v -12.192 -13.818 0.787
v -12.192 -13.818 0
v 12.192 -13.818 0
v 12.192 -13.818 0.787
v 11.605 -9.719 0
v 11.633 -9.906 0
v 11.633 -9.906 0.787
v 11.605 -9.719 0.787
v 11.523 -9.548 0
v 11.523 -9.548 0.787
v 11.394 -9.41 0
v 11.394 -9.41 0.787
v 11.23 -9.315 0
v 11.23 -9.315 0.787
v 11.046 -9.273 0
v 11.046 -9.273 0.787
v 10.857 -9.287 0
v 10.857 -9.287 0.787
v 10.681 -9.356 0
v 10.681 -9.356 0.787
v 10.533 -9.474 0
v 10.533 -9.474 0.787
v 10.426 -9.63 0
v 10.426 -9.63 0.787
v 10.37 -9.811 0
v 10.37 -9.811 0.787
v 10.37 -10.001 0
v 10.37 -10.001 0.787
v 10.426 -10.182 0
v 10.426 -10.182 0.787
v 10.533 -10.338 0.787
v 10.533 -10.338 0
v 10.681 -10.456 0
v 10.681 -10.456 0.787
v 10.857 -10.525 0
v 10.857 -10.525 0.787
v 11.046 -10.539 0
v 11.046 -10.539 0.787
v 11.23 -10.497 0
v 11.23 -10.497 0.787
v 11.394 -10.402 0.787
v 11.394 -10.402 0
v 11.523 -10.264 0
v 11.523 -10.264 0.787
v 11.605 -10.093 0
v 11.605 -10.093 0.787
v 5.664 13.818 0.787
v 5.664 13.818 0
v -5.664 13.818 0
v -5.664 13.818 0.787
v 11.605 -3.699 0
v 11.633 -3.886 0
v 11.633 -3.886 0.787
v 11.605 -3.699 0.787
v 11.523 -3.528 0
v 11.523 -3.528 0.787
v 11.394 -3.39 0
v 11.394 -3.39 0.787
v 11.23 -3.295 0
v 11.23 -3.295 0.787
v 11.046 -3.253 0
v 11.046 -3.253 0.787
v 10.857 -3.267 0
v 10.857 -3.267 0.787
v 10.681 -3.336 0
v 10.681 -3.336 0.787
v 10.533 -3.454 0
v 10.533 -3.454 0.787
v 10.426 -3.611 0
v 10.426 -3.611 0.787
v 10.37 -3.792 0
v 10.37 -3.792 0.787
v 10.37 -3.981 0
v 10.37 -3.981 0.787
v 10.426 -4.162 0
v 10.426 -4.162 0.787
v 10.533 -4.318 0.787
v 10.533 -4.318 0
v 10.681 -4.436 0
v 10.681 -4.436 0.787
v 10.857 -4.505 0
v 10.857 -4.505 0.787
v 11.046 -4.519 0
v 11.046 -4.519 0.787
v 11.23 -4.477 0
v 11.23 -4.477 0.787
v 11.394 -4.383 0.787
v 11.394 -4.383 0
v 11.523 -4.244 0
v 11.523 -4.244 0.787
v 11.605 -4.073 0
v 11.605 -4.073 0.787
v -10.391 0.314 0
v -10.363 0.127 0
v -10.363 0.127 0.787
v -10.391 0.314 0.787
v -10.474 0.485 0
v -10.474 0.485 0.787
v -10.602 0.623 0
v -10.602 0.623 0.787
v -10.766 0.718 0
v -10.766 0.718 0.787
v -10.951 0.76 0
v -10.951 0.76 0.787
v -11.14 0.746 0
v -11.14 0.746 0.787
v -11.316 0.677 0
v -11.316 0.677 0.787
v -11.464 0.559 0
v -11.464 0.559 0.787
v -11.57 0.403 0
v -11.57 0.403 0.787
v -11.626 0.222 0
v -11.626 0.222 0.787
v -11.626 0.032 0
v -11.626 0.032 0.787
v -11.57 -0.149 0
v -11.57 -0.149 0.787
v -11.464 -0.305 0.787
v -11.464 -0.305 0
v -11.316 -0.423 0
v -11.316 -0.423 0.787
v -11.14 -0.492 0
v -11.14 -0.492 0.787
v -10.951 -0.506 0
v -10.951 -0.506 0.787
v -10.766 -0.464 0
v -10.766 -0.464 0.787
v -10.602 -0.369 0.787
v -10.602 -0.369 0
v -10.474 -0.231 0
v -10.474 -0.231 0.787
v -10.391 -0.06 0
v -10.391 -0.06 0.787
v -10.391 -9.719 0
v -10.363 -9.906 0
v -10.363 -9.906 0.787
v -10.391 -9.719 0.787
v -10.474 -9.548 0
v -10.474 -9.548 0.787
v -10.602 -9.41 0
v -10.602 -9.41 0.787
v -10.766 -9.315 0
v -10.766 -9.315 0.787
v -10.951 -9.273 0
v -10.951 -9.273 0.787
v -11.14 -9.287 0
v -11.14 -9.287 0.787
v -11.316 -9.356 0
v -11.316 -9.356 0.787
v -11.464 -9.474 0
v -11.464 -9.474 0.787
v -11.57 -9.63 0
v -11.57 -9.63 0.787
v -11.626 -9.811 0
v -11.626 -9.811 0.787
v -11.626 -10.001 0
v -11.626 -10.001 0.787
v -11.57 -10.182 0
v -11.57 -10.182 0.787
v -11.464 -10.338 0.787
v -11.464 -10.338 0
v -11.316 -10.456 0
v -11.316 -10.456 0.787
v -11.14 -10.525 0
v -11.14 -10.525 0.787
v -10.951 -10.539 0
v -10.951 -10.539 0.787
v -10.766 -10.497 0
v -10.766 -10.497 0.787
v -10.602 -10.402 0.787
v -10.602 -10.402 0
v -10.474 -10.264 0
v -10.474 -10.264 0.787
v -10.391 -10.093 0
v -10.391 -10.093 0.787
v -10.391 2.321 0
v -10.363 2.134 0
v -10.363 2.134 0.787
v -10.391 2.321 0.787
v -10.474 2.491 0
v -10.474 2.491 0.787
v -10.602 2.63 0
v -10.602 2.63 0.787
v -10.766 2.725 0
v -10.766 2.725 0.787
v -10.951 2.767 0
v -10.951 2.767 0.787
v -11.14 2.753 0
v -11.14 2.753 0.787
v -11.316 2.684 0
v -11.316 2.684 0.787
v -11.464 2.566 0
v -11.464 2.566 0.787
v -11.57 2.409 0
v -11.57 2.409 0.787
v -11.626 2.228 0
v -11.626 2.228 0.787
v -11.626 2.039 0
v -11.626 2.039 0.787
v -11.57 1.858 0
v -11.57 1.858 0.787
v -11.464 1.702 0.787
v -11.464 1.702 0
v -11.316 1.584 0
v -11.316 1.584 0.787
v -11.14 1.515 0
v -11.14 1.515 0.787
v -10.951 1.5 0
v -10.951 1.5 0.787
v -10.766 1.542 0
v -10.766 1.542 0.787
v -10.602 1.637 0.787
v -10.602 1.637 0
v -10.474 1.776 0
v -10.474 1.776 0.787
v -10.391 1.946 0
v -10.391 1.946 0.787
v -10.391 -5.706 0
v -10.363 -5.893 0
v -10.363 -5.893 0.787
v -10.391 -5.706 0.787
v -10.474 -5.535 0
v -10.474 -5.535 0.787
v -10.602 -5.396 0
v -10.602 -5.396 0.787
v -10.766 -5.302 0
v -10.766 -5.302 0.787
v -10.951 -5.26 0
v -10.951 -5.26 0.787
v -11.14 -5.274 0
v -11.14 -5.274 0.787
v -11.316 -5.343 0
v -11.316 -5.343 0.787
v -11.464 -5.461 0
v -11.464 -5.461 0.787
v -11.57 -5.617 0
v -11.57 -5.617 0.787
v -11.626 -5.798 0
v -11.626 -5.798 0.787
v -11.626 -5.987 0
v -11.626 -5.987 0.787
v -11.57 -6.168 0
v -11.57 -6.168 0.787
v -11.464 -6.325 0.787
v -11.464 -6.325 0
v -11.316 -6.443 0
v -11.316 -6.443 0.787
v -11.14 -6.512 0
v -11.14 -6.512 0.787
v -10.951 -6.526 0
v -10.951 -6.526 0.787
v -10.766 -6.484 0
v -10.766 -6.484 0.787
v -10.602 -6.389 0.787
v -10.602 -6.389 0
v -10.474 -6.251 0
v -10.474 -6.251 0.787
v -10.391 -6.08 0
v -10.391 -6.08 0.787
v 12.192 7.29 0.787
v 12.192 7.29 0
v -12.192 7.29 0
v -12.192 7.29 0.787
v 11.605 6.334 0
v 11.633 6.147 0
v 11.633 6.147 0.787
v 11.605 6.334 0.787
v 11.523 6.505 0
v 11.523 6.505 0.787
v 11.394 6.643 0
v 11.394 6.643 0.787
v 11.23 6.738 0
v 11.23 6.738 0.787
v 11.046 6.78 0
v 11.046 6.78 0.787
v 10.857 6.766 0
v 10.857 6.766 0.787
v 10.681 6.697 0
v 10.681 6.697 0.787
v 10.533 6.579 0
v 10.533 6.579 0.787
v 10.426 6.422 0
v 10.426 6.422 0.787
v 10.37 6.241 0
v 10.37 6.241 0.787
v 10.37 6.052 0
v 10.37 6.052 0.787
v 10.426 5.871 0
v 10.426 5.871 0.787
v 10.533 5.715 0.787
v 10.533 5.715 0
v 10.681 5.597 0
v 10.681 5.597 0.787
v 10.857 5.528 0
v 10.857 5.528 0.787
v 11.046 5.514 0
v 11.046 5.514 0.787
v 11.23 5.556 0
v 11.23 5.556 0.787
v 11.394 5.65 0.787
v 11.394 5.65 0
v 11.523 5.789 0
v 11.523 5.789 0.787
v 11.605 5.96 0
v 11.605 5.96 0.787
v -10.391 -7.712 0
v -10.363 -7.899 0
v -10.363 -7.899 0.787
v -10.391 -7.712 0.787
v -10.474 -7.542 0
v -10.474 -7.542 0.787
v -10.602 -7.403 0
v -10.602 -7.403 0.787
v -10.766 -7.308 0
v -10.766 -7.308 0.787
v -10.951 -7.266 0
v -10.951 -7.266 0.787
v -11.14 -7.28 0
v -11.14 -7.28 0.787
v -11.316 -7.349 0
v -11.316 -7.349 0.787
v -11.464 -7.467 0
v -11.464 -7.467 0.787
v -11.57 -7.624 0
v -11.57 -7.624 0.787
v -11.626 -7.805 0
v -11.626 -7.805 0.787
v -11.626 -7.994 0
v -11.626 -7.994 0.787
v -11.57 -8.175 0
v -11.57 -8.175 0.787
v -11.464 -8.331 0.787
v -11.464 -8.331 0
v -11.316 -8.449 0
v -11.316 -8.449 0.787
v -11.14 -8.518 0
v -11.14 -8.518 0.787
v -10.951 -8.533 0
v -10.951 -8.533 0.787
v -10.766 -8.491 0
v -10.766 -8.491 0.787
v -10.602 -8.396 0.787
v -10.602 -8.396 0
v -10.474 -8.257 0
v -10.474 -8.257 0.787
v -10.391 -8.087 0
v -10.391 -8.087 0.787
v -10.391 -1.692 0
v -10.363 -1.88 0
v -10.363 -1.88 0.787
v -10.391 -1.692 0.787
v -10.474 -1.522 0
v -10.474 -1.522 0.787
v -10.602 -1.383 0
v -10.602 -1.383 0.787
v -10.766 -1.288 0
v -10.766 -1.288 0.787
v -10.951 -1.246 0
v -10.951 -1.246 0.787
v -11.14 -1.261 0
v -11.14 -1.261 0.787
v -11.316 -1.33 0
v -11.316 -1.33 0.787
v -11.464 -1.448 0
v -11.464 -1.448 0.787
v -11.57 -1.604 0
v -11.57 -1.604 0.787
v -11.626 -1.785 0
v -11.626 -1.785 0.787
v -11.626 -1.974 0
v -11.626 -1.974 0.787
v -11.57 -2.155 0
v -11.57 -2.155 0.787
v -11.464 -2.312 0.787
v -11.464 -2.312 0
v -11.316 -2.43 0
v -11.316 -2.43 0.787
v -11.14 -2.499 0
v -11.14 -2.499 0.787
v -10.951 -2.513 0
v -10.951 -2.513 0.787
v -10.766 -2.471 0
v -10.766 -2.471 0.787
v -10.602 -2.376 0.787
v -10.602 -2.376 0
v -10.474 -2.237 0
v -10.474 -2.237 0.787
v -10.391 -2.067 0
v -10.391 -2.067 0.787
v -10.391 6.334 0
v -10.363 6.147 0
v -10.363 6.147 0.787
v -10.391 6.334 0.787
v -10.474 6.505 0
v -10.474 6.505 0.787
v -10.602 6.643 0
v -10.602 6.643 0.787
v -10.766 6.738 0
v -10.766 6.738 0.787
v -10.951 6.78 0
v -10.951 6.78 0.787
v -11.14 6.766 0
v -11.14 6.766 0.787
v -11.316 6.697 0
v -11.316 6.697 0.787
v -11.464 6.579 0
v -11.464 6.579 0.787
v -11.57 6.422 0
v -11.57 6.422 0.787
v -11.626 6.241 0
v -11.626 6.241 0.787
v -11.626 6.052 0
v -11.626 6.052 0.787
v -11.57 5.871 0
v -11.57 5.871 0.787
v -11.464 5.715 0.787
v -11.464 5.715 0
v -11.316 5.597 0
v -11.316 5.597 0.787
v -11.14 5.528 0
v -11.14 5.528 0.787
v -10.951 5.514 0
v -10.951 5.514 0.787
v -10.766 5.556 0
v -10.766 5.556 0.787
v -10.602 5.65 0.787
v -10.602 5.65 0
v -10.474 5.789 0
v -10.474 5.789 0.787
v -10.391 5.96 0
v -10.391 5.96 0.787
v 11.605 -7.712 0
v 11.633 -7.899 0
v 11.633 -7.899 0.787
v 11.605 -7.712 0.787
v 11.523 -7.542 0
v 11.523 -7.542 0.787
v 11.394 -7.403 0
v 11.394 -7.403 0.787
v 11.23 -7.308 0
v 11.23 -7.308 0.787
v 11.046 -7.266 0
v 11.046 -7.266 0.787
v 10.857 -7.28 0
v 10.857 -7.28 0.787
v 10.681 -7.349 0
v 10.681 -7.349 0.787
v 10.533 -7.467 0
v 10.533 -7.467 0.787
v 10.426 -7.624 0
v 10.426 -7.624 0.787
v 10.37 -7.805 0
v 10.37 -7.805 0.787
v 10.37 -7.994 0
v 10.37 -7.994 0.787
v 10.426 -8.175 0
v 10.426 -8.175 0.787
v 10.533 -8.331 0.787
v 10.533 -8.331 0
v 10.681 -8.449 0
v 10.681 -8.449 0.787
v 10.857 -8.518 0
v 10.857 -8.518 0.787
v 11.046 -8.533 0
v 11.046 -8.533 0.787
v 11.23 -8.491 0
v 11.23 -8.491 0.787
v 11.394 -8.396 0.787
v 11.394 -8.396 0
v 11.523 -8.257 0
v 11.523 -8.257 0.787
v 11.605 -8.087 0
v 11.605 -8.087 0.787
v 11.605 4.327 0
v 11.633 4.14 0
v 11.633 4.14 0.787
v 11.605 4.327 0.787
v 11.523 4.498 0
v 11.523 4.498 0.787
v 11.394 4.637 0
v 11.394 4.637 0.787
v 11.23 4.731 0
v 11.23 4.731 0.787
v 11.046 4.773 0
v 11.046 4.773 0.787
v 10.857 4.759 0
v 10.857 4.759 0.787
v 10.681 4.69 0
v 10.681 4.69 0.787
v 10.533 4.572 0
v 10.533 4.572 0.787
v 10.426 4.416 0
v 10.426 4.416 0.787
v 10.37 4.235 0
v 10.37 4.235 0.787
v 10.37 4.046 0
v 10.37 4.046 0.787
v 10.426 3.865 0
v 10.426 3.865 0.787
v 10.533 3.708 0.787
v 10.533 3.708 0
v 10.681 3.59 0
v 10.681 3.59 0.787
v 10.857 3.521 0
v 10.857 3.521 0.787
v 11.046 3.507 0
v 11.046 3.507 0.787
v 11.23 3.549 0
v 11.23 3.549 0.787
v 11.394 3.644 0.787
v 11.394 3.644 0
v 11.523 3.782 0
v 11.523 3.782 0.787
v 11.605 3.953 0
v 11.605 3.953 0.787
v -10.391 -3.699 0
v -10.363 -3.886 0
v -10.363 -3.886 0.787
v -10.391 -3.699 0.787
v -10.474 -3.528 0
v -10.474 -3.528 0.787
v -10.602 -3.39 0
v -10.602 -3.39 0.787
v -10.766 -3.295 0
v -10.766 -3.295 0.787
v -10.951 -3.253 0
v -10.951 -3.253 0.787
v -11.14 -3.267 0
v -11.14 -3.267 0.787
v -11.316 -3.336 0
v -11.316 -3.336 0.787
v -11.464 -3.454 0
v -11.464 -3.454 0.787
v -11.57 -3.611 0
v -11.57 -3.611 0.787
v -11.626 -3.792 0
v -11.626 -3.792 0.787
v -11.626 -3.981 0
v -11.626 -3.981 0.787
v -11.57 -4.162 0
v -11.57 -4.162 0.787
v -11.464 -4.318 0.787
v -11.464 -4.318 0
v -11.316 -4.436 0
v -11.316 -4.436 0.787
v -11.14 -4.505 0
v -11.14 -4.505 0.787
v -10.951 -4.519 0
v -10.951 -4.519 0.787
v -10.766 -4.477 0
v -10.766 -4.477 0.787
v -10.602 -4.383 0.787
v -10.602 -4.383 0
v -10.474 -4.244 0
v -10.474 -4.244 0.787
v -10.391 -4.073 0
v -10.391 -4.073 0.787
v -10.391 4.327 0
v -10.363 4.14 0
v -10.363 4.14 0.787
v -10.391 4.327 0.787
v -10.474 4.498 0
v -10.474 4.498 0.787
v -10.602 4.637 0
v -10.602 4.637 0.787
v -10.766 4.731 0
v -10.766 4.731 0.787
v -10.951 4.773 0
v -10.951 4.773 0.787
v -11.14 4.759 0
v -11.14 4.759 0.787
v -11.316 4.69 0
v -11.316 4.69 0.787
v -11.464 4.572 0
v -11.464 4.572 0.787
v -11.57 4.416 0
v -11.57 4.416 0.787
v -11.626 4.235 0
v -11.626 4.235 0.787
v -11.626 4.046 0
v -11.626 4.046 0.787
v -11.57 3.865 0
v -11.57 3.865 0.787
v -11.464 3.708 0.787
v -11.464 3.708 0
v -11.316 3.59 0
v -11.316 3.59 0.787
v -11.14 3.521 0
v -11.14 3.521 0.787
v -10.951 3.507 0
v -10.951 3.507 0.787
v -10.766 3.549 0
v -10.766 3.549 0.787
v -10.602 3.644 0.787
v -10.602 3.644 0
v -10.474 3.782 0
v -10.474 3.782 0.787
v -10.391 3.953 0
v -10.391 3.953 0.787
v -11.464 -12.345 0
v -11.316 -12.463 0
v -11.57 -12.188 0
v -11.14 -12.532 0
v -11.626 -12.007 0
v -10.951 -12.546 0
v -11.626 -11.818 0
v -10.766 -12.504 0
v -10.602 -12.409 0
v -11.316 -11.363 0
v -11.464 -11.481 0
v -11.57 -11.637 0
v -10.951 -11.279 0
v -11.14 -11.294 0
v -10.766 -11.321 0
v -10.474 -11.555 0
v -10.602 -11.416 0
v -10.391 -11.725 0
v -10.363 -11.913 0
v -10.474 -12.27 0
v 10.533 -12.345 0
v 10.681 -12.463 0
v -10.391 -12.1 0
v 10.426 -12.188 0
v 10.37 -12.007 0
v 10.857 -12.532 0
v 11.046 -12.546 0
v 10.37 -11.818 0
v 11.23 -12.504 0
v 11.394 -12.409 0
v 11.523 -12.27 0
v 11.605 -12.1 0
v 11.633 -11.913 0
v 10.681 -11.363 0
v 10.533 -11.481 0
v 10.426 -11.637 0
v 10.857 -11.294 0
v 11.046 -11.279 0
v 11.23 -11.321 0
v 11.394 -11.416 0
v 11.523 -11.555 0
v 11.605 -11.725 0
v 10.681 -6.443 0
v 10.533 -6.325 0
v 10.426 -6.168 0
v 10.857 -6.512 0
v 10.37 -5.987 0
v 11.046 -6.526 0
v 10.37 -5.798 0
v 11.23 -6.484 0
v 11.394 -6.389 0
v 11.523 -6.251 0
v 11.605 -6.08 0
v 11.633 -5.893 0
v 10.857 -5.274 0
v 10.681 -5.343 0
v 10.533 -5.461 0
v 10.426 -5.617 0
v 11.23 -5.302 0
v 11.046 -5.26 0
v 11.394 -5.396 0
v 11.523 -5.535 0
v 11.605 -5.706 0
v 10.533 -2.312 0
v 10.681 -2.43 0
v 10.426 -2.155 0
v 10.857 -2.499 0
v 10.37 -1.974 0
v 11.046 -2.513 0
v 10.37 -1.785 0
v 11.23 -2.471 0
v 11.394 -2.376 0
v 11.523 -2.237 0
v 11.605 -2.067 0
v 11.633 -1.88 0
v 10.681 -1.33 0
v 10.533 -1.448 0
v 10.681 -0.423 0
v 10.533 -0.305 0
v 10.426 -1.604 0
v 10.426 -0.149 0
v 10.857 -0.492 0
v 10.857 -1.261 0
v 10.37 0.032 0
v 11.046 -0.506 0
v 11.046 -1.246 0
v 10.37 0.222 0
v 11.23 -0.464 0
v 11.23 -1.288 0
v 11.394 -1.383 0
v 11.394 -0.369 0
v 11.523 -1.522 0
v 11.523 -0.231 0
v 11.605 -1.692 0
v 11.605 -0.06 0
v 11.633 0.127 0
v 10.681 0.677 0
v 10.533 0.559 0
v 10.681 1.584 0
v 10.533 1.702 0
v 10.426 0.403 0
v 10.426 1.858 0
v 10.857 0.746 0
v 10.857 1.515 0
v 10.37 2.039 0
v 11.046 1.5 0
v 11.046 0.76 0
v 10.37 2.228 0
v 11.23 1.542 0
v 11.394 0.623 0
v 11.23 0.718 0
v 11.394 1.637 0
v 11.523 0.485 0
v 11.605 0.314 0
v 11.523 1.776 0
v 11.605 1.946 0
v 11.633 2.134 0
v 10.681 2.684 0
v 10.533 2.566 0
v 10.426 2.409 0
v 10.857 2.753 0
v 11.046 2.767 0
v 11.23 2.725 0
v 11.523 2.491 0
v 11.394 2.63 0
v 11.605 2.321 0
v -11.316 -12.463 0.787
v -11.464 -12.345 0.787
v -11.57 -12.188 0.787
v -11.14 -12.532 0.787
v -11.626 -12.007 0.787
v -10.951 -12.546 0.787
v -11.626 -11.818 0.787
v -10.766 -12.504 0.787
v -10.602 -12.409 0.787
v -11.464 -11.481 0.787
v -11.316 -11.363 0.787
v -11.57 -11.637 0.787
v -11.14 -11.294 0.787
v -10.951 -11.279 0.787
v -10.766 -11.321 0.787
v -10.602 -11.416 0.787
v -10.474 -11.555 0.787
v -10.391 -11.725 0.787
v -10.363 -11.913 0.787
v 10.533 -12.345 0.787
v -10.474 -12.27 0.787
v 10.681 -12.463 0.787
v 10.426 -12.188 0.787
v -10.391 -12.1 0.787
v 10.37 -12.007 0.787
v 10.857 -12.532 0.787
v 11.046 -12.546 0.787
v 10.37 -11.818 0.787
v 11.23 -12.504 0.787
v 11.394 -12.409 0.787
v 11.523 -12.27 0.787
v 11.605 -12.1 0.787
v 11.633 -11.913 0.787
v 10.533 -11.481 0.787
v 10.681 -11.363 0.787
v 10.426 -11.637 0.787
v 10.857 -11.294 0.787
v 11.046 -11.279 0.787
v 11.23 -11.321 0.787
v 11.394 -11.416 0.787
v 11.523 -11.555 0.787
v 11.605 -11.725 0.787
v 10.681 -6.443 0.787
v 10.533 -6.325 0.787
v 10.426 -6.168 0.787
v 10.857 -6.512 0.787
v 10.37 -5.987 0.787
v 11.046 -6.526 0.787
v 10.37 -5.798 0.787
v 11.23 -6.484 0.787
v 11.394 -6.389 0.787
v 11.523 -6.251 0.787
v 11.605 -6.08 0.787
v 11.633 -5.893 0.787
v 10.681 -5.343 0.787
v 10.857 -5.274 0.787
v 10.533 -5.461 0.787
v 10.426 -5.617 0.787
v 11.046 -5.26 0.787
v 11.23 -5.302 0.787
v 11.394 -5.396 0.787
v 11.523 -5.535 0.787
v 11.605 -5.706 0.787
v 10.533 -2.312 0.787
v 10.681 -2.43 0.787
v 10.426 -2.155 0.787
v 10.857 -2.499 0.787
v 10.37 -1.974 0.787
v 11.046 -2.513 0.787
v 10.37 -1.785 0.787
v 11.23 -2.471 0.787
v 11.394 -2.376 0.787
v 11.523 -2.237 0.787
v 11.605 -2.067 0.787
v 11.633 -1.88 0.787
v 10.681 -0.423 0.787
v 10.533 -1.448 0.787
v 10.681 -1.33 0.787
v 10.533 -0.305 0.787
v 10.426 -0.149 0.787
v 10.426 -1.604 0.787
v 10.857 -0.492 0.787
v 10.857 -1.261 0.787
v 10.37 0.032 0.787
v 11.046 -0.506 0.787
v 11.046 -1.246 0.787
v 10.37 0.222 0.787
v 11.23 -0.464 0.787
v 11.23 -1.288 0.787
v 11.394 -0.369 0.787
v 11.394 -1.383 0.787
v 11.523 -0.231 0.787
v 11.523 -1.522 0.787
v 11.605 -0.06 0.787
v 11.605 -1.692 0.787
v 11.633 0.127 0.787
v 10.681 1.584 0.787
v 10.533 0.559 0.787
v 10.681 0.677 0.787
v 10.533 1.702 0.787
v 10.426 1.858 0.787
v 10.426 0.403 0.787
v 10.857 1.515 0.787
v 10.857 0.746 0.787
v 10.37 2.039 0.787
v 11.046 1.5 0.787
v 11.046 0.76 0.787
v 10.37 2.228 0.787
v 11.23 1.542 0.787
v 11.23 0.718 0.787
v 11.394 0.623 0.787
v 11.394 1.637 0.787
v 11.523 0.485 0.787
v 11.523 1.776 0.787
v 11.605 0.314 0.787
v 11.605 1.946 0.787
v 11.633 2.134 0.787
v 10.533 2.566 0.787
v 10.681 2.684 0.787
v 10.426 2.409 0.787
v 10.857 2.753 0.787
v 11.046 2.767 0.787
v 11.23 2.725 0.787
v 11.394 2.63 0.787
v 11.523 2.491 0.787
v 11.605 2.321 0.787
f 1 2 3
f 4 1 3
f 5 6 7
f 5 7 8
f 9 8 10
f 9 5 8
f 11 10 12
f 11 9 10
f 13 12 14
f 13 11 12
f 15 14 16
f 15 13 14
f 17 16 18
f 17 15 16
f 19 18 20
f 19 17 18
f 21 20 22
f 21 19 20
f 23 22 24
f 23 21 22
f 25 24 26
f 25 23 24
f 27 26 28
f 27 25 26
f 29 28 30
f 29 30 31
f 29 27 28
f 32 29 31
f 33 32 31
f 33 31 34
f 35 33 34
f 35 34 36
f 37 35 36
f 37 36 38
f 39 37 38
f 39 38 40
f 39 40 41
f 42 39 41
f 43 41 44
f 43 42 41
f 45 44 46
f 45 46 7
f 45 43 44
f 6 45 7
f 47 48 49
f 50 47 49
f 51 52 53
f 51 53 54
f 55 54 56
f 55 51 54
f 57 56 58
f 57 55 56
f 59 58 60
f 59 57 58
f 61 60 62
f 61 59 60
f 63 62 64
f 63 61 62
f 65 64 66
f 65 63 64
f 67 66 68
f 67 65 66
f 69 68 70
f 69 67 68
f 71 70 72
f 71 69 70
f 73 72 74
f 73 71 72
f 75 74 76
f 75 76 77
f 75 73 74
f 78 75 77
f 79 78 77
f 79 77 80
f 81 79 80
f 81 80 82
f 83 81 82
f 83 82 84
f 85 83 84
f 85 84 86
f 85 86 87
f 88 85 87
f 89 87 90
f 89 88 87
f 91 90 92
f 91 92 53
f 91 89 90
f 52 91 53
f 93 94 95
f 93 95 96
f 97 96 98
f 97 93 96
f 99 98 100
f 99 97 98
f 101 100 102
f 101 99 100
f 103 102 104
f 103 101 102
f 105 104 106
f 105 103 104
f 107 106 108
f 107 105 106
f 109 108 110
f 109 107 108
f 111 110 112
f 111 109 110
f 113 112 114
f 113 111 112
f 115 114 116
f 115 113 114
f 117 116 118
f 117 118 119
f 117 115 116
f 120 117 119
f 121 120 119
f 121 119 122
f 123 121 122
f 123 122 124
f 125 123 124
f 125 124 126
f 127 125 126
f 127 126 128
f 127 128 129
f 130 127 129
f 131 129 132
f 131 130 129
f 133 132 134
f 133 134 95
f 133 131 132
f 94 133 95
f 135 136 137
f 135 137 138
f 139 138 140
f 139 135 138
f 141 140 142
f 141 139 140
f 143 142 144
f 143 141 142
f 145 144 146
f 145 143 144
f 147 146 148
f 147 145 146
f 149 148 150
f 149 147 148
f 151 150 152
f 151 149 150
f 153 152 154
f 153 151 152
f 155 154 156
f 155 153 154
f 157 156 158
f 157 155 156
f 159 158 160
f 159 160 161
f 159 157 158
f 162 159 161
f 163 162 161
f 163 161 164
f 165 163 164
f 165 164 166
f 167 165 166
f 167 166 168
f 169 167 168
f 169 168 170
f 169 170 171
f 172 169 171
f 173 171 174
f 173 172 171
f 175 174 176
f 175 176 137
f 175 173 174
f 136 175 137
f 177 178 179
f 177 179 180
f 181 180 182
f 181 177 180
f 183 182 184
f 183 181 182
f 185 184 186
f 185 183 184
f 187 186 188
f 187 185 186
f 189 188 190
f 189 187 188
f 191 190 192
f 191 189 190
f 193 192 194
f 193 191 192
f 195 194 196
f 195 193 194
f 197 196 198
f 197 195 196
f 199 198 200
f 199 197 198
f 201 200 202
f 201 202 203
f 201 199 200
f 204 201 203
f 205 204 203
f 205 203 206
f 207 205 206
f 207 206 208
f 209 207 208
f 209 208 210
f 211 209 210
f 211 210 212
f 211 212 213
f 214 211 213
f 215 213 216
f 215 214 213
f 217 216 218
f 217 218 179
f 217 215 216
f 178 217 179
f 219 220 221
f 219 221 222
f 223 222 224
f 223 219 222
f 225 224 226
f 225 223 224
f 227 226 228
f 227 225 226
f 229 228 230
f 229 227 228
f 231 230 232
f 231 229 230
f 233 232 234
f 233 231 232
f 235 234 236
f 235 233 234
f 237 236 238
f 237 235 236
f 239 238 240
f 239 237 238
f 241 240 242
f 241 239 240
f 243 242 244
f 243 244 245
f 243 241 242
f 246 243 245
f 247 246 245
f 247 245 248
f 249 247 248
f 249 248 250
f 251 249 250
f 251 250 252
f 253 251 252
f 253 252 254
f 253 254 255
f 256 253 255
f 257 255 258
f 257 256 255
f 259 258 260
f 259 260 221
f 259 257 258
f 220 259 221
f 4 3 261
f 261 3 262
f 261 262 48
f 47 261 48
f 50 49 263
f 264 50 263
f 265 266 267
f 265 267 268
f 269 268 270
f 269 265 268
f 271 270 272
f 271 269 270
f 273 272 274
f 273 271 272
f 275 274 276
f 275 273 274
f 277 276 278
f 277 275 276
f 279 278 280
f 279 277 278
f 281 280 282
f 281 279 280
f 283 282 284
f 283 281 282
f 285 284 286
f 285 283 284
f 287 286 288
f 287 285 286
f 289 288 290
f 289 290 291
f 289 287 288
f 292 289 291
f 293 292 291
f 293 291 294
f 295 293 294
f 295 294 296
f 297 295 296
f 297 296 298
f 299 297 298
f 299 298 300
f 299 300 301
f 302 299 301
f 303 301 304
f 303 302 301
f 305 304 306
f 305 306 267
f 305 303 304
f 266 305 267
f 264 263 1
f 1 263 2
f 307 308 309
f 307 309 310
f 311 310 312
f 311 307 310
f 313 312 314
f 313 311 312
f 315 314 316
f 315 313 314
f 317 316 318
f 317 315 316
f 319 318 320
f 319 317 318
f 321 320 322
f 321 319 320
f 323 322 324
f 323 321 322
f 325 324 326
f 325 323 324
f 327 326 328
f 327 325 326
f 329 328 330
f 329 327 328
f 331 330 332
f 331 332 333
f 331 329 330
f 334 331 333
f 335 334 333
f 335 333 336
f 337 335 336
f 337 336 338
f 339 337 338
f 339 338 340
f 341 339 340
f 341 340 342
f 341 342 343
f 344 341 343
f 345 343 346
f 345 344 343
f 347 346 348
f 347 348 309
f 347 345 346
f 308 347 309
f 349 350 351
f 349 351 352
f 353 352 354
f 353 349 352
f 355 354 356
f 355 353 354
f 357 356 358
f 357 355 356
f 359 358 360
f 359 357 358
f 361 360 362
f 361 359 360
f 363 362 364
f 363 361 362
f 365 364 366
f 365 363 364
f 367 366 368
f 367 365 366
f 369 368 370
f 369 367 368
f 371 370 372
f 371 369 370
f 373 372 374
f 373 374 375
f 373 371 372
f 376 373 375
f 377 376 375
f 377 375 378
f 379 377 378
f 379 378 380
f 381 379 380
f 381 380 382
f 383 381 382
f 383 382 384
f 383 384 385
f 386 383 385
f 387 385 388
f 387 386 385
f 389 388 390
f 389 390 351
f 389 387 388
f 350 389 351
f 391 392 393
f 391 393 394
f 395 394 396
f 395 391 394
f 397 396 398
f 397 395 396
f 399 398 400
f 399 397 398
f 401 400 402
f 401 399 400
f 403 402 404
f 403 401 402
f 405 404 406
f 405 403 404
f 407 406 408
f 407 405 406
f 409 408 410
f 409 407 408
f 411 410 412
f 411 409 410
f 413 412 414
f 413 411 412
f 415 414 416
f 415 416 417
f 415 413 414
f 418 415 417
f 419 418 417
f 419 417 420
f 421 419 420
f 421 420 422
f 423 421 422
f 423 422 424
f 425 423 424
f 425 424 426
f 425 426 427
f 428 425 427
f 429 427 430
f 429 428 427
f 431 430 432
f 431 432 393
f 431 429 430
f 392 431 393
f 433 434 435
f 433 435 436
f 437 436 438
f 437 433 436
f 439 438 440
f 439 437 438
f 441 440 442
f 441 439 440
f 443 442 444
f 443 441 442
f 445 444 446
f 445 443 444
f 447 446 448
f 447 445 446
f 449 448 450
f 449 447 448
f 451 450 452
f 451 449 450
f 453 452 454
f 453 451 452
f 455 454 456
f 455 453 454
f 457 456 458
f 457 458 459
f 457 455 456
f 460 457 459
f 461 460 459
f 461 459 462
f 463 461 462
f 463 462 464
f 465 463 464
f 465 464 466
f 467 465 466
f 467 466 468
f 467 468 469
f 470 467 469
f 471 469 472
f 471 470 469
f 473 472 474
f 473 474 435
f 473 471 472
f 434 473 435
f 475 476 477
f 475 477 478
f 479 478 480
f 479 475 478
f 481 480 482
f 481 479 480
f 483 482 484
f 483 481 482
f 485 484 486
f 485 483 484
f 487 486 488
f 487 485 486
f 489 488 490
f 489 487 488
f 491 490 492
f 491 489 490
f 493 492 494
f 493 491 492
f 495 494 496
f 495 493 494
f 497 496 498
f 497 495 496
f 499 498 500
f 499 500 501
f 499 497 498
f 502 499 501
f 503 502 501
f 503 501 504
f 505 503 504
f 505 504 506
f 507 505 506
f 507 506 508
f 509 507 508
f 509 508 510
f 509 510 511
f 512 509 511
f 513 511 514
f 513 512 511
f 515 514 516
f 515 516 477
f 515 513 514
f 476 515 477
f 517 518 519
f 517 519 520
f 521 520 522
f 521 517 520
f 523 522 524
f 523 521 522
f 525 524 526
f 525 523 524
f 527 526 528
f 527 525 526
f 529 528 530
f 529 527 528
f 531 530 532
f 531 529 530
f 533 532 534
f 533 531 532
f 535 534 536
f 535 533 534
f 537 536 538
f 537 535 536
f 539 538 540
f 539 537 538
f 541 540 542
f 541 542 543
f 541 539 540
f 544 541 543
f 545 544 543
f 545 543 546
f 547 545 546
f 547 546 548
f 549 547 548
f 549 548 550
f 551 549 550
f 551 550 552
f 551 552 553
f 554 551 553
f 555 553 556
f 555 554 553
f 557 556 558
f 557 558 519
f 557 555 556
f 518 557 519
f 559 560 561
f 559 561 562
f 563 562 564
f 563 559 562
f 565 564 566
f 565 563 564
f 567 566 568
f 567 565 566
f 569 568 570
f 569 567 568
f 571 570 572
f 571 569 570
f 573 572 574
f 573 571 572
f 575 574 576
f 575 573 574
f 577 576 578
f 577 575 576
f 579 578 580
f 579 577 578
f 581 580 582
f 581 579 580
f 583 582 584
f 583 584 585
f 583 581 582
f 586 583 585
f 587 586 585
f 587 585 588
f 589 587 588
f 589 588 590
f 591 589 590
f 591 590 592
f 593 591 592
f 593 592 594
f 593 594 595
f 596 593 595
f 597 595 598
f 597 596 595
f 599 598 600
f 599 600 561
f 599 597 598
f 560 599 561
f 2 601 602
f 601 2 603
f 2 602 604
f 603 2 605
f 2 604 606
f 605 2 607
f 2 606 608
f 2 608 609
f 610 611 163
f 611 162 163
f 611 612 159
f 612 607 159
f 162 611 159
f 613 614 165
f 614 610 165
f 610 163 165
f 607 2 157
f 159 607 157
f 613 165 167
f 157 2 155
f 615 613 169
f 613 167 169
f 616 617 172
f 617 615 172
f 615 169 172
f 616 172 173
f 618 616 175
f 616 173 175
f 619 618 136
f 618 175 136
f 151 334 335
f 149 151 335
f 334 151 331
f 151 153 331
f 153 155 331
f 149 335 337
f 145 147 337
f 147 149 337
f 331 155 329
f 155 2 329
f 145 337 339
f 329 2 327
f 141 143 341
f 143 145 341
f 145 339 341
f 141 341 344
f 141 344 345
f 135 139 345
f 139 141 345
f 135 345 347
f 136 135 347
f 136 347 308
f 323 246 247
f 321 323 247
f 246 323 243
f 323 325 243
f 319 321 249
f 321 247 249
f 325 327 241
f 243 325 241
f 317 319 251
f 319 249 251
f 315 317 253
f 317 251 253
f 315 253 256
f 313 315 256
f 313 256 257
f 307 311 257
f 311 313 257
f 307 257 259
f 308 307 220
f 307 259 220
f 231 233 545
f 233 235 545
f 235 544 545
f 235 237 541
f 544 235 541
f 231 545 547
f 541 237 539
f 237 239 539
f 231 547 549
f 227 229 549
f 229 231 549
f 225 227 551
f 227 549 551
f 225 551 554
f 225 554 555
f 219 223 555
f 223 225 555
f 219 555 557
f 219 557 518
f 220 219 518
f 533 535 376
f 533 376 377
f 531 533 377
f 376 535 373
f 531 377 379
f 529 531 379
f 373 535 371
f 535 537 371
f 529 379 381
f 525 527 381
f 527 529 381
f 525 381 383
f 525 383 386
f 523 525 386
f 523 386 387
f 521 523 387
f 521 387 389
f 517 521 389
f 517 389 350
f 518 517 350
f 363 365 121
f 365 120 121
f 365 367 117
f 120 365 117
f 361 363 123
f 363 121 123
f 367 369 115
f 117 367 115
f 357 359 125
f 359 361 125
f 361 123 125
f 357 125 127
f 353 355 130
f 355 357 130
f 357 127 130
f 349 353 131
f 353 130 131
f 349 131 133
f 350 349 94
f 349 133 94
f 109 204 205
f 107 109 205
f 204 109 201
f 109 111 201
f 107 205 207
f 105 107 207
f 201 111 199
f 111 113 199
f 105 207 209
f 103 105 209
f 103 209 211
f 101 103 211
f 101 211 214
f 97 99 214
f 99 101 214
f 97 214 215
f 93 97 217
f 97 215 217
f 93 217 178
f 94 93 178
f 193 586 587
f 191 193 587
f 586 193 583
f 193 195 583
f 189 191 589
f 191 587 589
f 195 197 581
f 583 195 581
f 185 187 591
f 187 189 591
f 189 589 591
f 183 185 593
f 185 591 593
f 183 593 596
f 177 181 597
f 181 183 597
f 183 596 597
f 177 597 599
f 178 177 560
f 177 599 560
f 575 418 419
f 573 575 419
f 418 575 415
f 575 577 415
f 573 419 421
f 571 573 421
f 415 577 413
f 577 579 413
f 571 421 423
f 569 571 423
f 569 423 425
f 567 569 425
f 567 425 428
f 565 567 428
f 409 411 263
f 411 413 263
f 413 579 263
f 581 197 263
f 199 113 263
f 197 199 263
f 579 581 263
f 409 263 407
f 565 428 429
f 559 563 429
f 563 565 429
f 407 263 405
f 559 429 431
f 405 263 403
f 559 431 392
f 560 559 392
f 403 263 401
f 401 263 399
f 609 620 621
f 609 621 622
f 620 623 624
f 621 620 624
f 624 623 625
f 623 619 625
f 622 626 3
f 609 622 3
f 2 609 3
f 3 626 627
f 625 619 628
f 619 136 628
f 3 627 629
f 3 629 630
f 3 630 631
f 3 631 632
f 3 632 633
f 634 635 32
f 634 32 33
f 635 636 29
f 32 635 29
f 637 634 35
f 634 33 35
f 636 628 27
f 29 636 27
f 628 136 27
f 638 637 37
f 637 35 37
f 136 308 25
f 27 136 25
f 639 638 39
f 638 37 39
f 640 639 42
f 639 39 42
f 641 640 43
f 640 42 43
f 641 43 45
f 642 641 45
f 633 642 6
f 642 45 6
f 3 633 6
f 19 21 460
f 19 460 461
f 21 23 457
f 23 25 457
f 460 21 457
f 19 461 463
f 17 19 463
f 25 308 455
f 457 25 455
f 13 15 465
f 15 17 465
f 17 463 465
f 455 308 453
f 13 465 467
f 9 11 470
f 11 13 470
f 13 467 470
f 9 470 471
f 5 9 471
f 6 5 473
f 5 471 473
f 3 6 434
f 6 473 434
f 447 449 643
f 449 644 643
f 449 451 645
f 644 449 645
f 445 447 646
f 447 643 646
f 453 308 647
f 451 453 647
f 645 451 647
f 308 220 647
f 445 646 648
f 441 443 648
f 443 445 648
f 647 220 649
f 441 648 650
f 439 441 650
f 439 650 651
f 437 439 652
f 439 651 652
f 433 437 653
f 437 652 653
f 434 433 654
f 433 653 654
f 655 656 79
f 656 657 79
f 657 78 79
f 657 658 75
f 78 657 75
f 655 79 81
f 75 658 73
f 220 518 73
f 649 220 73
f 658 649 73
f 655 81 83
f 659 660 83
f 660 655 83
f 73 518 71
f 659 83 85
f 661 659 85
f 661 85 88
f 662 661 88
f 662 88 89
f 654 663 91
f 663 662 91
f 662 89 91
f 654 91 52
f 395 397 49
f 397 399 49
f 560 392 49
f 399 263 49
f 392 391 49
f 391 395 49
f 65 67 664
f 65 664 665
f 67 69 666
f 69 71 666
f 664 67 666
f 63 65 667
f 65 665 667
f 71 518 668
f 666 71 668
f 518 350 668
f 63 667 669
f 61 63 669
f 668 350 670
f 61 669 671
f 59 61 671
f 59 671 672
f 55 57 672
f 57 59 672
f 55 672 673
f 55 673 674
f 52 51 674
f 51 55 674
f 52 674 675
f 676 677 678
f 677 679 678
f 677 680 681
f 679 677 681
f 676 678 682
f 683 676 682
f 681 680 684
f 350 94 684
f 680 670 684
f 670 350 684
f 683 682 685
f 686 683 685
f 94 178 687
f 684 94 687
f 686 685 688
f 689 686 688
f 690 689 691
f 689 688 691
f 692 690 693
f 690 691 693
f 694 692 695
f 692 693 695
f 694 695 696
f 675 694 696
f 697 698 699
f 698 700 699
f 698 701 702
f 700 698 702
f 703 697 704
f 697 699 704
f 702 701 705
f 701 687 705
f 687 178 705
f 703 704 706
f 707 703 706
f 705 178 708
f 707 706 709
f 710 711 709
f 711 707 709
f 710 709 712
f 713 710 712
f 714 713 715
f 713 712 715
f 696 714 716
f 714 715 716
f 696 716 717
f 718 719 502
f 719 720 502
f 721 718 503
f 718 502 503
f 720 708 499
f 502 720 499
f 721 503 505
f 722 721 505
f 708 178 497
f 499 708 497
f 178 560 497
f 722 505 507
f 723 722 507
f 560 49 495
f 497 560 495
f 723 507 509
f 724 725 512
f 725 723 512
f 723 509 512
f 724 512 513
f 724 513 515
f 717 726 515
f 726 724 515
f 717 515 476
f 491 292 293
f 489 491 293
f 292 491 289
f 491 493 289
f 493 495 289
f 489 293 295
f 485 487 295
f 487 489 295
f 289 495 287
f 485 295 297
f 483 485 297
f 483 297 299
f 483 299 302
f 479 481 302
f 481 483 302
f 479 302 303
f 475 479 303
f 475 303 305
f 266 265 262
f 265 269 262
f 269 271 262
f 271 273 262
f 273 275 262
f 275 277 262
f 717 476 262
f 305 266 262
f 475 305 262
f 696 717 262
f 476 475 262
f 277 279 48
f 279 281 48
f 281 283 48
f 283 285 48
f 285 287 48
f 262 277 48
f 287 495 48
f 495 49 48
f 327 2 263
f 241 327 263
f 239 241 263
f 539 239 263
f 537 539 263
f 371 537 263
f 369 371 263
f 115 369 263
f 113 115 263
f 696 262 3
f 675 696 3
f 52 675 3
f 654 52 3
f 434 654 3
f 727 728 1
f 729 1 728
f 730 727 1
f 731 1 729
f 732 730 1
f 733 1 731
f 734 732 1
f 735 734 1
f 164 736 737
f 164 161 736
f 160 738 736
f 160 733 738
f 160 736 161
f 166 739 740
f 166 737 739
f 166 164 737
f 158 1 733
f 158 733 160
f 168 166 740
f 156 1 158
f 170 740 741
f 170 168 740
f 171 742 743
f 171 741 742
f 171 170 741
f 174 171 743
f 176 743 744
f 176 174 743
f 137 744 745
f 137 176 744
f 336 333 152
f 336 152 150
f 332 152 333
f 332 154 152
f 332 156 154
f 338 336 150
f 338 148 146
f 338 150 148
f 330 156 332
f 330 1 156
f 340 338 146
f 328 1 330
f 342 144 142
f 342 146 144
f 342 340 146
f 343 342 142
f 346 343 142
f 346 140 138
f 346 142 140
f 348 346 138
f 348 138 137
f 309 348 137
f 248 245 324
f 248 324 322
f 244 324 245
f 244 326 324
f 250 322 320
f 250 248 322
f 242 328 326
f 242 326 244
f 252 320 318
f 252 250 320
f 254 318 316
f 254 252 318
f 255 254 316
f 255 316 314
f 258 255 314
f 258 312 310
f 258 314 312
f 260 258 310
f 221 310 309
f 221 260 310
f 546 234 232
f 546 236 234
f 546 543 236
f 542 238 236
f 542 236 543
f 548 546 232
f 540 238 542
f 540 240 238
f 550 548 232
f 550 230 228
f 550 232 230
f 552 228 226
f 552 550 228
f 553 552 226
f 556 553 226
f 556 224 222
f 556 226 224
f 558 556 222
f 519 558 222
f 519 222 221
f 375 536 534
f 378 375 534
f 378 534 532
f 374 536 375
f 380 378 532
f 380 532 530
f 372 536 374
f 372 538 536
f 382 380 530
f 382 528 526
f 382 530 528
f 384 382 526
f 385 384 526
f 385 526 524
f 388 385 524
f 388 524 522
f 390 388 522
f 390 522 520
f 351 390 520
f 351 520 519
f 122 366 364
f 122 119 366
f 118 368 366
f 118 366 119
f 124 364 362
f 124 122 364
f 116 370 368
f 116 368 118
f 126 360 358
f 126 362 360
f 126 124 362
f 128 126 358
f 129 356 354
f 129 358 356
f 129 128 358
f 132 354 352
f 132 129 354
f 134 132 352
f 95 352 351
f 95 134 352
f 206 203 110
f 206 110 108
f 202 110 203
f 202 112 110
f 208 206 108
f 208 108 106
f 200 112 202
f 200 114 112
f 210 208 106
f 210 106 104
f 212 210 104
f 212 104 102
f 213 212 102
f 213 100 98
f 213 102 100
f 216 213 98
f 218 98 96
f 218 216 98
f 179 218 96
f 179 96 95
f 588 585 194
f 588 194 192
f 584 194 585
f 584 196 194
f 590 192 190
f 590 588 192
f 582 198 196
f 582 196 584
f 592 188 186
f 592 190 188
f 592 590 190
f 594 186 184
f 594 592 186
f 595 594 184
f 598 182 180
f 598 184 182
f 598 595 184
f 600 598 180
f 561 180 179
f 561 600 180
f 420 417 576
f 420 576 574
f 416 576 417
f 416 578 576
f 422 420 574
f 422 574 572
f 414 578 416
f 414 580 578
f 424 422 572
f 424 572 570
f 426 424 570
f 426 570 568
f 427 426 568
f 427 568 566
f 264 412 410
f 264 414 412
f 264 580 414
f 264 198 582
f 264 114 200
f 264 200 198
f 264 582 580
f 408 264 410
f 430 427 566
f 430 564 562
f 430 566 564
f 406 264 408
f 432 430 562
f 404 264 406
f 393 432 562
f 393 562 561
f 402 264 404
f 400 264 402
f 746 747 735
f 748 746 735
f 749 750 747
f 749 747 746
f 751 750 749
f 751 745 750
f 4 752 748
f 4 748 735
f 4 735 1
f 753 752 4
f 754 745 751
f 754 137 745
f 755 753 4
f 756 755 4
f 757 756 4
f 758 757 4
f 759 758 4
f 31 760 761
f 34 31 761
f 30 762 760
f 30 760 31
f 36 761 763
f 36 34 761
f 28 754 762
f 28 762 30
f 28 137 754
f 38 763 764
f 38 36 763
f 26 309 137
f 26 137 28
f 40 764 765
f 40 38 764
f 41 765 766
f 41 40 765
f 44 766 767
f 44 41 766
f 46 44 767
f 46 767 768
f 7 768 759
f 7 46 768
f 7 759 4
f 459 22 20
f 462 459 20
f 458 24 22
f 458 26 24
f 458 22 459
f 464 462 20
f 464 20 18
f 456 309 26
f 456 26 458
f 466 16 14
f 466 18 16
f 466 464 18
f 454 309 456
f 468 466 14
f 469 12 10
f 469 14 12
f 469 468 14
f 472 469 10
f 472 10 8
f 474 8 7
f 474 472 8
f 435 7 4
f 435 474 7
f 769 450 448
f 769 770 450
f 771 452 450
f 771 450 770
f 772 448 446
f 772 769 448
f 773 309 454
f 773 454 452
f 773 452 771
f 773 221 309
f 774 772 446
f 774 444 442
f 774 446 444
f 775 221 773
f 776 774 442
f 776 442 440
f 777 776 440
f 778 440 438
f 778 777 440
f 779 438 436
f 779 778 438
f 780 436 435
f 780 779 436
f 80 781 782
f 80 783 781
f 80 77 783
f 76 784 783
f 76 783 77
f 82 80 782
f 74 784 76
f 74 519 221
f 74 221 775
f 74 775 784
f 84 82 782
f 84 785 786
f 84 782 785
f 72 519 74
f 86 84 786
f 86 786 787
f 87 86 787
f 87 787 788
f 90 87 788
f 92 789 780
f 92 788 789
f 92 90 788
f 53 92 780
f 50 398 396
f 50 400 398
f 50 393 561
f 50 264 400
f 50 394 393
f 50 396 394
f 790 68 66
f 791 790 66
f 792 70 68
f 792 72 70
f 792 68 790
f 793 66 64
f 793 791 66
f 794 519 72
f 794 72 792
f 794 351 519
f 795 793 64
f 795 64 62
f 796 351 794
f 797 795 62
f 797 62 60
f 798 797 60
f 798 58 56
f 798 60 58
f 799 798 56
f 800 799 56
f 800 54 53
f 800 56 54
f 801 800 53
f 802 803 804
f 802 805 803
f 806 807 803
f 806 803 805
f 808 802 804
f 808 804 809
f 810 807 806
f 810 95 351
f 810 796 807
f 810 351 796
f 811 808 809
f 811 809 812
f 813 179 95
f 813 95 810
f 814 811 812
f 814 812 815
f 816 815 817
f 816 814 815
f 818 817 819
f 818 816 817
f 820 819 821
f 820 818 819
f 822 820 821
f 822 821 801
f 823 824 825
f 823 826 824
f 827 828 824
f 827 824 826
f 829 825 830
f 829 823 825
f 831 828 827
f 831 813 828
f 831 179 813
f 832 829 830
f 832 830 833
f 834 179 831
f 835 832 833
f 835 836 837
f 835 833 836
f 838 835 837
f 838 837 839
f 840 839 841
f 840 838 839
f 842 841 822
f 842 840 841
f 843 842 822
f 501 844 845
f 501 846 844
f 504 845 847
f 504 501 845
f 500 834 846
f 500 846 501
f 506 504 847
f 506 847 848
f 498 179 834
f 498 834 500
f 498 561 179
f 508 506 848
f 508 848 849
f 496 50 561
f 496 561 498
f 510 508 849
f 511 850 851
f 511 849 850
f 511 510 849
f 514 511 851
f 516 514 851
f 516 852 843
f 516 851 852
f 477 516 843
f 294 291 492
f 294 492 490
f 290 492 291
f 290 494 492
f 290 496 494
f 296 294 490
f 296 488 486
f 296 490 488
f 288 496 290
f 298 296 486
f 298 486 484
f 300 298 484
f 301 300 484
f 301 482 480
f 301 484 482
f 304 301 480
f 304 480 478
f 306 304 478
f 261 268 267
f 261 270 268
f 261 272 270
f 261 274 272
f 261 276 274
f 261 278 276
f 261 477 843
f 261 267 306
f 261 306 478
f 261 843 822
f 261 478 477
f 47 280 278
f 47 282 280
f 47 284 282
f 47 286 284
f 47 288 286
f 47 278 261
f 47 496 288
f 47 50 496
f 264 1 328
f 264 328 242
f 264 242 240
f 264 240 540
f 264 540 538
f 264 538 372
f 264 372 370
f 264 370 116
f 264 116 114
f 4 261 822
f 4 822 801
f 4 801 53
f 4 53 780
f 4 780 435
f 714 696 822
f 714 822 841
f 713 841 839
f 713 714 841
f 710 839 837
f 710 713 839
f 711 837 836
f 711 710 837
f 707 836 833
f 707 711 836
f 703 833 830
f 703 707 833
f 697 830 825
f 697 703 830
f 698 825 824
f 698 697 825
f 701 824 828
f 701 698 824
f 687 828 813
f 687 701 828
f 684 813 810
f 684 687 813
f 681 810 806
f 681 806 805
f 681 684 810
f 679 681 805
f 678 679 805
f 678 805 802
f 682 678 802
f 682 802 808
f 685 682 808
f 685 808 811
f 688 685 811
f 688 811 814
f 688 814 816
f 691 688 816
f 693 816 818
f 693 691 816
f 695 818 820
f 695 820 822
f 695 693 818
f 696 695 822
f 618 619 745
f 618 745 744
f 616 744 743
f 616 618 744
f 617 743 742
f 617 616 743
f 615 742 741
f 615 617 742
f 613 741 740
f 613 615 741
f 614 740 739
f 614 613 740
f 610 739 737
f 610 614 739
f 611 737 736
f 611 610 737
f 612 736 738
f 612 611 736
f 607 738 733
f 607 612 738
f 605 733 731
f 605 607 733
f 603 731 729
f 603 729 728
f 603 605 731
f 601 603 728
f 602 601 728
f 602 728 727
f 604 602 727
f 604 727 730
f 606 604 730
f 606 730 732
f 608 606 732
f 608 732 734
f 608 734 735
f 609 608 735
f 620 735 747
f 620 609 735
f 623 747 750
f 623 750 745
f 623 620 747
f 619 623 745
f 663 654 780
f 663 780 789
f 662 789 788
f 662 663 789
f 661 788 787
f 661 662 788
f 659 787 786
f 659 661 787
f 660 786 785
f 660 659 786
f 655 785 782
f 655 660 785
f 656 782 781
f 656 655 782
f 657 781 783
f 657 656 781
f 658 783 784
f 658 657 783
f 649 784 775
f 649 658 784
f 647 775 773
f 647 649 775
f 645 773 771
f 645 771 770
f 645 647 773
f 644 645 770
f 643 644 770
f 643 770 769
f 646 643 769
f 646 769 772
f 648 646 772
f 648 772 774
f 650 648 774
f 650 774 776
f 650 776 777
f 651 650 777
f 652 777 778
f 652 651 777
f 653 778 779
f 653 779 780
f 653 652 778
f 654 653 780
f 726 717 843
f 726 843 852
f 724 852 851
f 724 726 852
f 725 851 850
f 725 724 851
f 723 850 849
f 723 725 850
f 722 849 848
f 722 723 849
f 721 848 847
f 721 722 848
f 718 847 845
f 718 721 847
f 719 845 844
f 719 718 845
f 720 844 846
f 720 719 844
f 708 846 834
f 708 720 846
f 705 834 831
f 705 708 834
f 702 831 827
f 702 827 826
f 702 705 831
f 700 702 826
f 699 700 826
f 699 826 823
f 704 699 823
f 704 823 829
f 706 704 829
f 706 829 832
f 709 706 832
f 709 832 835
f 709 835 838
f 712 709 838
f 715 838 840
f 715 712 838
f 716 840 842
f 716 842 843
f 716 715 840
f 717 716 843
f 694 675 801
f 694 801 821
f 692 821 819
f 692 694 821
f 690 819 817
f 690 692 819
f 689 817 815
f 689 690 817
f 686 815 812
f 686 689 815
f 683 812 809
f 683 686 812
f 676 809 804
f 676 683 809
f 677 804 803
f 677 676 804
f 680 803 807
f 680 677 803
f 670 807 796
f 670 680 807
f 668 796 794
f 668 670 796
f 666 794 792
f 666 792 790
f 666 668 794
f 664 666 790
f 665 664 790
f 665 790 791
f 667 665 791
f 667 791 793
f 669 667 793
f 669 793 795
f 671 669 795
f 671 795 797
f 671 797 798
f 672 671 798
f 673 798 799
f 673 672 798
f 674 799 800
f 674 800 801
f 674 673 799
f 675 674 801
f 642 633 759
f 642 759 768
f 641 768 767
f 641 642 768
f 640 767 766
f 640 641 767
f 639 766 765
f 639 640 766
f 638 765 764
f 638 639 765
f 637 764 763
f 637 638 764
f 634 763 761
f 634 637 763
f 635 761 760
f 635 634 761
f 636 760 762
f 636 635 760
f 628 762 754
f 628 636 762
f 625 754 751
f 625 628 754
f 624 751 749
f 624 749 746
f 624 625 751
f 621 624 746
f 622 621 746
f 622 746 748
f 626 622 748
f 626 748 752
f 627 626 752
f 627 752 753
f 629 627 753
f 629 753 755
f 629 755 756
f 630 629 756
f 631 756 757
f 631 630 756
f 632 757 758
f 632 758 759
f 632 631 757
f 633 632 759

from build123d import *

# Parameters (mm, degrees)
CROQUIS1_R              = 0.635
SALIENTE_EXTRUIR1_DEPTH = 0.7874


with BuildPart() as part:
    # Croquis1 → Saliente-Extruir1 (new body)
    with BuildSketch(Plane.XY):
        Polygon((-5.6642, 13.8176), (-12.192, 7.2898), (-12.192, -13.8176), (12.192, -13.8176), (12.192, 7.2898), (5.6642, 13.8176), align=None)
        with Locations((-10.9982, -11.9126)):
            Circle(CROQUIS1_R, mode=Mode.SUBTRACT)
        with Locations((10.9982, -11.9126)):
            Circle(CROQUIS1_R, mode=Mode.SUBTRACT)
        with Locations((10.9982, -9.906)):
            Circle(CROQUIS1_R, mode=Mode.SUBTRACT)
        with Locations((10.9982, -7.8994)):
            Circle(CROQUIS1_R, mode=Mode.SUBTRACT)
        with Locations((10.9982, -5.8928)):
            Circle(CROQUIS1_R, mode=Mode.SUBTRACT)
        with Locations((10.9982, -3.8862)):
            Circle(CROQUIS1_R, mode=Mode.SUBTRACT)
        with Locations((10.9982, -1.8796)):
            Circle(CROQUIS1_R, mode=Mode.SUBTRACT)
        with Locations((10.9982, 0.127)):
            Circle(CROQUIS1_R, mode=Mode.SUBTRACT)
        with Locations((10.9982, 2.1336)):
            Circle(CROQUIS1_R, mode=Mode.SUBTRACT)
        with Locations((10.9982, 4.1402)):
            Circle(CROQUIS1_R, mode=Mode.SUBTRACT)
        with Locations((10.9982, 6.1468)):
            Circle(CROQUIS1_R, mode=Mode.SUBTRACT)
        with Locations((-10.9982, -9.906)):
            Circle(CROQUIS1_R, mode=Mode.SUBTRACT)
        with Locations((-10.9982, -7.8994)):
            Circle(CROQUIS1_R, mode=Mode.SUBTRACT)
        with Locations((-10.9982, -5.8928)):
            Circle(CROQUIS1_R, mode=Mode.SUBTRACT)
        with Locations((-10.9982, -3.8862)):
            Circle(CROQUIS1_R, mode=Mode.SUBTRACT)
        with Locations((-10.9982, -1.8796)):
            Circle(CROQUIS1_R, mode=Mode.SUBTRACT)
        with Locations((-10.9982, 0.127)):
            Circle(CROQUIS1_R, mode=Mode.SUBTRACT)
        with Locations((-10.9982, 2.1336)):
            Circle(CROQUIS1_R, mode=Mode.SUBTRACT)
        with Locations((-10.9982, 4.1402)):
            Circle(CROQUIS1_R, mode=Mode.SUBTRACT)
        with Locations((-10.9982, 6.1468)):
            Circle(CROQUIS1_R, mode=Mode.SUBTRACT)
    extrude(amount=SALIENTE_EXTRUIR1_DEPTH)


solid = part.part
